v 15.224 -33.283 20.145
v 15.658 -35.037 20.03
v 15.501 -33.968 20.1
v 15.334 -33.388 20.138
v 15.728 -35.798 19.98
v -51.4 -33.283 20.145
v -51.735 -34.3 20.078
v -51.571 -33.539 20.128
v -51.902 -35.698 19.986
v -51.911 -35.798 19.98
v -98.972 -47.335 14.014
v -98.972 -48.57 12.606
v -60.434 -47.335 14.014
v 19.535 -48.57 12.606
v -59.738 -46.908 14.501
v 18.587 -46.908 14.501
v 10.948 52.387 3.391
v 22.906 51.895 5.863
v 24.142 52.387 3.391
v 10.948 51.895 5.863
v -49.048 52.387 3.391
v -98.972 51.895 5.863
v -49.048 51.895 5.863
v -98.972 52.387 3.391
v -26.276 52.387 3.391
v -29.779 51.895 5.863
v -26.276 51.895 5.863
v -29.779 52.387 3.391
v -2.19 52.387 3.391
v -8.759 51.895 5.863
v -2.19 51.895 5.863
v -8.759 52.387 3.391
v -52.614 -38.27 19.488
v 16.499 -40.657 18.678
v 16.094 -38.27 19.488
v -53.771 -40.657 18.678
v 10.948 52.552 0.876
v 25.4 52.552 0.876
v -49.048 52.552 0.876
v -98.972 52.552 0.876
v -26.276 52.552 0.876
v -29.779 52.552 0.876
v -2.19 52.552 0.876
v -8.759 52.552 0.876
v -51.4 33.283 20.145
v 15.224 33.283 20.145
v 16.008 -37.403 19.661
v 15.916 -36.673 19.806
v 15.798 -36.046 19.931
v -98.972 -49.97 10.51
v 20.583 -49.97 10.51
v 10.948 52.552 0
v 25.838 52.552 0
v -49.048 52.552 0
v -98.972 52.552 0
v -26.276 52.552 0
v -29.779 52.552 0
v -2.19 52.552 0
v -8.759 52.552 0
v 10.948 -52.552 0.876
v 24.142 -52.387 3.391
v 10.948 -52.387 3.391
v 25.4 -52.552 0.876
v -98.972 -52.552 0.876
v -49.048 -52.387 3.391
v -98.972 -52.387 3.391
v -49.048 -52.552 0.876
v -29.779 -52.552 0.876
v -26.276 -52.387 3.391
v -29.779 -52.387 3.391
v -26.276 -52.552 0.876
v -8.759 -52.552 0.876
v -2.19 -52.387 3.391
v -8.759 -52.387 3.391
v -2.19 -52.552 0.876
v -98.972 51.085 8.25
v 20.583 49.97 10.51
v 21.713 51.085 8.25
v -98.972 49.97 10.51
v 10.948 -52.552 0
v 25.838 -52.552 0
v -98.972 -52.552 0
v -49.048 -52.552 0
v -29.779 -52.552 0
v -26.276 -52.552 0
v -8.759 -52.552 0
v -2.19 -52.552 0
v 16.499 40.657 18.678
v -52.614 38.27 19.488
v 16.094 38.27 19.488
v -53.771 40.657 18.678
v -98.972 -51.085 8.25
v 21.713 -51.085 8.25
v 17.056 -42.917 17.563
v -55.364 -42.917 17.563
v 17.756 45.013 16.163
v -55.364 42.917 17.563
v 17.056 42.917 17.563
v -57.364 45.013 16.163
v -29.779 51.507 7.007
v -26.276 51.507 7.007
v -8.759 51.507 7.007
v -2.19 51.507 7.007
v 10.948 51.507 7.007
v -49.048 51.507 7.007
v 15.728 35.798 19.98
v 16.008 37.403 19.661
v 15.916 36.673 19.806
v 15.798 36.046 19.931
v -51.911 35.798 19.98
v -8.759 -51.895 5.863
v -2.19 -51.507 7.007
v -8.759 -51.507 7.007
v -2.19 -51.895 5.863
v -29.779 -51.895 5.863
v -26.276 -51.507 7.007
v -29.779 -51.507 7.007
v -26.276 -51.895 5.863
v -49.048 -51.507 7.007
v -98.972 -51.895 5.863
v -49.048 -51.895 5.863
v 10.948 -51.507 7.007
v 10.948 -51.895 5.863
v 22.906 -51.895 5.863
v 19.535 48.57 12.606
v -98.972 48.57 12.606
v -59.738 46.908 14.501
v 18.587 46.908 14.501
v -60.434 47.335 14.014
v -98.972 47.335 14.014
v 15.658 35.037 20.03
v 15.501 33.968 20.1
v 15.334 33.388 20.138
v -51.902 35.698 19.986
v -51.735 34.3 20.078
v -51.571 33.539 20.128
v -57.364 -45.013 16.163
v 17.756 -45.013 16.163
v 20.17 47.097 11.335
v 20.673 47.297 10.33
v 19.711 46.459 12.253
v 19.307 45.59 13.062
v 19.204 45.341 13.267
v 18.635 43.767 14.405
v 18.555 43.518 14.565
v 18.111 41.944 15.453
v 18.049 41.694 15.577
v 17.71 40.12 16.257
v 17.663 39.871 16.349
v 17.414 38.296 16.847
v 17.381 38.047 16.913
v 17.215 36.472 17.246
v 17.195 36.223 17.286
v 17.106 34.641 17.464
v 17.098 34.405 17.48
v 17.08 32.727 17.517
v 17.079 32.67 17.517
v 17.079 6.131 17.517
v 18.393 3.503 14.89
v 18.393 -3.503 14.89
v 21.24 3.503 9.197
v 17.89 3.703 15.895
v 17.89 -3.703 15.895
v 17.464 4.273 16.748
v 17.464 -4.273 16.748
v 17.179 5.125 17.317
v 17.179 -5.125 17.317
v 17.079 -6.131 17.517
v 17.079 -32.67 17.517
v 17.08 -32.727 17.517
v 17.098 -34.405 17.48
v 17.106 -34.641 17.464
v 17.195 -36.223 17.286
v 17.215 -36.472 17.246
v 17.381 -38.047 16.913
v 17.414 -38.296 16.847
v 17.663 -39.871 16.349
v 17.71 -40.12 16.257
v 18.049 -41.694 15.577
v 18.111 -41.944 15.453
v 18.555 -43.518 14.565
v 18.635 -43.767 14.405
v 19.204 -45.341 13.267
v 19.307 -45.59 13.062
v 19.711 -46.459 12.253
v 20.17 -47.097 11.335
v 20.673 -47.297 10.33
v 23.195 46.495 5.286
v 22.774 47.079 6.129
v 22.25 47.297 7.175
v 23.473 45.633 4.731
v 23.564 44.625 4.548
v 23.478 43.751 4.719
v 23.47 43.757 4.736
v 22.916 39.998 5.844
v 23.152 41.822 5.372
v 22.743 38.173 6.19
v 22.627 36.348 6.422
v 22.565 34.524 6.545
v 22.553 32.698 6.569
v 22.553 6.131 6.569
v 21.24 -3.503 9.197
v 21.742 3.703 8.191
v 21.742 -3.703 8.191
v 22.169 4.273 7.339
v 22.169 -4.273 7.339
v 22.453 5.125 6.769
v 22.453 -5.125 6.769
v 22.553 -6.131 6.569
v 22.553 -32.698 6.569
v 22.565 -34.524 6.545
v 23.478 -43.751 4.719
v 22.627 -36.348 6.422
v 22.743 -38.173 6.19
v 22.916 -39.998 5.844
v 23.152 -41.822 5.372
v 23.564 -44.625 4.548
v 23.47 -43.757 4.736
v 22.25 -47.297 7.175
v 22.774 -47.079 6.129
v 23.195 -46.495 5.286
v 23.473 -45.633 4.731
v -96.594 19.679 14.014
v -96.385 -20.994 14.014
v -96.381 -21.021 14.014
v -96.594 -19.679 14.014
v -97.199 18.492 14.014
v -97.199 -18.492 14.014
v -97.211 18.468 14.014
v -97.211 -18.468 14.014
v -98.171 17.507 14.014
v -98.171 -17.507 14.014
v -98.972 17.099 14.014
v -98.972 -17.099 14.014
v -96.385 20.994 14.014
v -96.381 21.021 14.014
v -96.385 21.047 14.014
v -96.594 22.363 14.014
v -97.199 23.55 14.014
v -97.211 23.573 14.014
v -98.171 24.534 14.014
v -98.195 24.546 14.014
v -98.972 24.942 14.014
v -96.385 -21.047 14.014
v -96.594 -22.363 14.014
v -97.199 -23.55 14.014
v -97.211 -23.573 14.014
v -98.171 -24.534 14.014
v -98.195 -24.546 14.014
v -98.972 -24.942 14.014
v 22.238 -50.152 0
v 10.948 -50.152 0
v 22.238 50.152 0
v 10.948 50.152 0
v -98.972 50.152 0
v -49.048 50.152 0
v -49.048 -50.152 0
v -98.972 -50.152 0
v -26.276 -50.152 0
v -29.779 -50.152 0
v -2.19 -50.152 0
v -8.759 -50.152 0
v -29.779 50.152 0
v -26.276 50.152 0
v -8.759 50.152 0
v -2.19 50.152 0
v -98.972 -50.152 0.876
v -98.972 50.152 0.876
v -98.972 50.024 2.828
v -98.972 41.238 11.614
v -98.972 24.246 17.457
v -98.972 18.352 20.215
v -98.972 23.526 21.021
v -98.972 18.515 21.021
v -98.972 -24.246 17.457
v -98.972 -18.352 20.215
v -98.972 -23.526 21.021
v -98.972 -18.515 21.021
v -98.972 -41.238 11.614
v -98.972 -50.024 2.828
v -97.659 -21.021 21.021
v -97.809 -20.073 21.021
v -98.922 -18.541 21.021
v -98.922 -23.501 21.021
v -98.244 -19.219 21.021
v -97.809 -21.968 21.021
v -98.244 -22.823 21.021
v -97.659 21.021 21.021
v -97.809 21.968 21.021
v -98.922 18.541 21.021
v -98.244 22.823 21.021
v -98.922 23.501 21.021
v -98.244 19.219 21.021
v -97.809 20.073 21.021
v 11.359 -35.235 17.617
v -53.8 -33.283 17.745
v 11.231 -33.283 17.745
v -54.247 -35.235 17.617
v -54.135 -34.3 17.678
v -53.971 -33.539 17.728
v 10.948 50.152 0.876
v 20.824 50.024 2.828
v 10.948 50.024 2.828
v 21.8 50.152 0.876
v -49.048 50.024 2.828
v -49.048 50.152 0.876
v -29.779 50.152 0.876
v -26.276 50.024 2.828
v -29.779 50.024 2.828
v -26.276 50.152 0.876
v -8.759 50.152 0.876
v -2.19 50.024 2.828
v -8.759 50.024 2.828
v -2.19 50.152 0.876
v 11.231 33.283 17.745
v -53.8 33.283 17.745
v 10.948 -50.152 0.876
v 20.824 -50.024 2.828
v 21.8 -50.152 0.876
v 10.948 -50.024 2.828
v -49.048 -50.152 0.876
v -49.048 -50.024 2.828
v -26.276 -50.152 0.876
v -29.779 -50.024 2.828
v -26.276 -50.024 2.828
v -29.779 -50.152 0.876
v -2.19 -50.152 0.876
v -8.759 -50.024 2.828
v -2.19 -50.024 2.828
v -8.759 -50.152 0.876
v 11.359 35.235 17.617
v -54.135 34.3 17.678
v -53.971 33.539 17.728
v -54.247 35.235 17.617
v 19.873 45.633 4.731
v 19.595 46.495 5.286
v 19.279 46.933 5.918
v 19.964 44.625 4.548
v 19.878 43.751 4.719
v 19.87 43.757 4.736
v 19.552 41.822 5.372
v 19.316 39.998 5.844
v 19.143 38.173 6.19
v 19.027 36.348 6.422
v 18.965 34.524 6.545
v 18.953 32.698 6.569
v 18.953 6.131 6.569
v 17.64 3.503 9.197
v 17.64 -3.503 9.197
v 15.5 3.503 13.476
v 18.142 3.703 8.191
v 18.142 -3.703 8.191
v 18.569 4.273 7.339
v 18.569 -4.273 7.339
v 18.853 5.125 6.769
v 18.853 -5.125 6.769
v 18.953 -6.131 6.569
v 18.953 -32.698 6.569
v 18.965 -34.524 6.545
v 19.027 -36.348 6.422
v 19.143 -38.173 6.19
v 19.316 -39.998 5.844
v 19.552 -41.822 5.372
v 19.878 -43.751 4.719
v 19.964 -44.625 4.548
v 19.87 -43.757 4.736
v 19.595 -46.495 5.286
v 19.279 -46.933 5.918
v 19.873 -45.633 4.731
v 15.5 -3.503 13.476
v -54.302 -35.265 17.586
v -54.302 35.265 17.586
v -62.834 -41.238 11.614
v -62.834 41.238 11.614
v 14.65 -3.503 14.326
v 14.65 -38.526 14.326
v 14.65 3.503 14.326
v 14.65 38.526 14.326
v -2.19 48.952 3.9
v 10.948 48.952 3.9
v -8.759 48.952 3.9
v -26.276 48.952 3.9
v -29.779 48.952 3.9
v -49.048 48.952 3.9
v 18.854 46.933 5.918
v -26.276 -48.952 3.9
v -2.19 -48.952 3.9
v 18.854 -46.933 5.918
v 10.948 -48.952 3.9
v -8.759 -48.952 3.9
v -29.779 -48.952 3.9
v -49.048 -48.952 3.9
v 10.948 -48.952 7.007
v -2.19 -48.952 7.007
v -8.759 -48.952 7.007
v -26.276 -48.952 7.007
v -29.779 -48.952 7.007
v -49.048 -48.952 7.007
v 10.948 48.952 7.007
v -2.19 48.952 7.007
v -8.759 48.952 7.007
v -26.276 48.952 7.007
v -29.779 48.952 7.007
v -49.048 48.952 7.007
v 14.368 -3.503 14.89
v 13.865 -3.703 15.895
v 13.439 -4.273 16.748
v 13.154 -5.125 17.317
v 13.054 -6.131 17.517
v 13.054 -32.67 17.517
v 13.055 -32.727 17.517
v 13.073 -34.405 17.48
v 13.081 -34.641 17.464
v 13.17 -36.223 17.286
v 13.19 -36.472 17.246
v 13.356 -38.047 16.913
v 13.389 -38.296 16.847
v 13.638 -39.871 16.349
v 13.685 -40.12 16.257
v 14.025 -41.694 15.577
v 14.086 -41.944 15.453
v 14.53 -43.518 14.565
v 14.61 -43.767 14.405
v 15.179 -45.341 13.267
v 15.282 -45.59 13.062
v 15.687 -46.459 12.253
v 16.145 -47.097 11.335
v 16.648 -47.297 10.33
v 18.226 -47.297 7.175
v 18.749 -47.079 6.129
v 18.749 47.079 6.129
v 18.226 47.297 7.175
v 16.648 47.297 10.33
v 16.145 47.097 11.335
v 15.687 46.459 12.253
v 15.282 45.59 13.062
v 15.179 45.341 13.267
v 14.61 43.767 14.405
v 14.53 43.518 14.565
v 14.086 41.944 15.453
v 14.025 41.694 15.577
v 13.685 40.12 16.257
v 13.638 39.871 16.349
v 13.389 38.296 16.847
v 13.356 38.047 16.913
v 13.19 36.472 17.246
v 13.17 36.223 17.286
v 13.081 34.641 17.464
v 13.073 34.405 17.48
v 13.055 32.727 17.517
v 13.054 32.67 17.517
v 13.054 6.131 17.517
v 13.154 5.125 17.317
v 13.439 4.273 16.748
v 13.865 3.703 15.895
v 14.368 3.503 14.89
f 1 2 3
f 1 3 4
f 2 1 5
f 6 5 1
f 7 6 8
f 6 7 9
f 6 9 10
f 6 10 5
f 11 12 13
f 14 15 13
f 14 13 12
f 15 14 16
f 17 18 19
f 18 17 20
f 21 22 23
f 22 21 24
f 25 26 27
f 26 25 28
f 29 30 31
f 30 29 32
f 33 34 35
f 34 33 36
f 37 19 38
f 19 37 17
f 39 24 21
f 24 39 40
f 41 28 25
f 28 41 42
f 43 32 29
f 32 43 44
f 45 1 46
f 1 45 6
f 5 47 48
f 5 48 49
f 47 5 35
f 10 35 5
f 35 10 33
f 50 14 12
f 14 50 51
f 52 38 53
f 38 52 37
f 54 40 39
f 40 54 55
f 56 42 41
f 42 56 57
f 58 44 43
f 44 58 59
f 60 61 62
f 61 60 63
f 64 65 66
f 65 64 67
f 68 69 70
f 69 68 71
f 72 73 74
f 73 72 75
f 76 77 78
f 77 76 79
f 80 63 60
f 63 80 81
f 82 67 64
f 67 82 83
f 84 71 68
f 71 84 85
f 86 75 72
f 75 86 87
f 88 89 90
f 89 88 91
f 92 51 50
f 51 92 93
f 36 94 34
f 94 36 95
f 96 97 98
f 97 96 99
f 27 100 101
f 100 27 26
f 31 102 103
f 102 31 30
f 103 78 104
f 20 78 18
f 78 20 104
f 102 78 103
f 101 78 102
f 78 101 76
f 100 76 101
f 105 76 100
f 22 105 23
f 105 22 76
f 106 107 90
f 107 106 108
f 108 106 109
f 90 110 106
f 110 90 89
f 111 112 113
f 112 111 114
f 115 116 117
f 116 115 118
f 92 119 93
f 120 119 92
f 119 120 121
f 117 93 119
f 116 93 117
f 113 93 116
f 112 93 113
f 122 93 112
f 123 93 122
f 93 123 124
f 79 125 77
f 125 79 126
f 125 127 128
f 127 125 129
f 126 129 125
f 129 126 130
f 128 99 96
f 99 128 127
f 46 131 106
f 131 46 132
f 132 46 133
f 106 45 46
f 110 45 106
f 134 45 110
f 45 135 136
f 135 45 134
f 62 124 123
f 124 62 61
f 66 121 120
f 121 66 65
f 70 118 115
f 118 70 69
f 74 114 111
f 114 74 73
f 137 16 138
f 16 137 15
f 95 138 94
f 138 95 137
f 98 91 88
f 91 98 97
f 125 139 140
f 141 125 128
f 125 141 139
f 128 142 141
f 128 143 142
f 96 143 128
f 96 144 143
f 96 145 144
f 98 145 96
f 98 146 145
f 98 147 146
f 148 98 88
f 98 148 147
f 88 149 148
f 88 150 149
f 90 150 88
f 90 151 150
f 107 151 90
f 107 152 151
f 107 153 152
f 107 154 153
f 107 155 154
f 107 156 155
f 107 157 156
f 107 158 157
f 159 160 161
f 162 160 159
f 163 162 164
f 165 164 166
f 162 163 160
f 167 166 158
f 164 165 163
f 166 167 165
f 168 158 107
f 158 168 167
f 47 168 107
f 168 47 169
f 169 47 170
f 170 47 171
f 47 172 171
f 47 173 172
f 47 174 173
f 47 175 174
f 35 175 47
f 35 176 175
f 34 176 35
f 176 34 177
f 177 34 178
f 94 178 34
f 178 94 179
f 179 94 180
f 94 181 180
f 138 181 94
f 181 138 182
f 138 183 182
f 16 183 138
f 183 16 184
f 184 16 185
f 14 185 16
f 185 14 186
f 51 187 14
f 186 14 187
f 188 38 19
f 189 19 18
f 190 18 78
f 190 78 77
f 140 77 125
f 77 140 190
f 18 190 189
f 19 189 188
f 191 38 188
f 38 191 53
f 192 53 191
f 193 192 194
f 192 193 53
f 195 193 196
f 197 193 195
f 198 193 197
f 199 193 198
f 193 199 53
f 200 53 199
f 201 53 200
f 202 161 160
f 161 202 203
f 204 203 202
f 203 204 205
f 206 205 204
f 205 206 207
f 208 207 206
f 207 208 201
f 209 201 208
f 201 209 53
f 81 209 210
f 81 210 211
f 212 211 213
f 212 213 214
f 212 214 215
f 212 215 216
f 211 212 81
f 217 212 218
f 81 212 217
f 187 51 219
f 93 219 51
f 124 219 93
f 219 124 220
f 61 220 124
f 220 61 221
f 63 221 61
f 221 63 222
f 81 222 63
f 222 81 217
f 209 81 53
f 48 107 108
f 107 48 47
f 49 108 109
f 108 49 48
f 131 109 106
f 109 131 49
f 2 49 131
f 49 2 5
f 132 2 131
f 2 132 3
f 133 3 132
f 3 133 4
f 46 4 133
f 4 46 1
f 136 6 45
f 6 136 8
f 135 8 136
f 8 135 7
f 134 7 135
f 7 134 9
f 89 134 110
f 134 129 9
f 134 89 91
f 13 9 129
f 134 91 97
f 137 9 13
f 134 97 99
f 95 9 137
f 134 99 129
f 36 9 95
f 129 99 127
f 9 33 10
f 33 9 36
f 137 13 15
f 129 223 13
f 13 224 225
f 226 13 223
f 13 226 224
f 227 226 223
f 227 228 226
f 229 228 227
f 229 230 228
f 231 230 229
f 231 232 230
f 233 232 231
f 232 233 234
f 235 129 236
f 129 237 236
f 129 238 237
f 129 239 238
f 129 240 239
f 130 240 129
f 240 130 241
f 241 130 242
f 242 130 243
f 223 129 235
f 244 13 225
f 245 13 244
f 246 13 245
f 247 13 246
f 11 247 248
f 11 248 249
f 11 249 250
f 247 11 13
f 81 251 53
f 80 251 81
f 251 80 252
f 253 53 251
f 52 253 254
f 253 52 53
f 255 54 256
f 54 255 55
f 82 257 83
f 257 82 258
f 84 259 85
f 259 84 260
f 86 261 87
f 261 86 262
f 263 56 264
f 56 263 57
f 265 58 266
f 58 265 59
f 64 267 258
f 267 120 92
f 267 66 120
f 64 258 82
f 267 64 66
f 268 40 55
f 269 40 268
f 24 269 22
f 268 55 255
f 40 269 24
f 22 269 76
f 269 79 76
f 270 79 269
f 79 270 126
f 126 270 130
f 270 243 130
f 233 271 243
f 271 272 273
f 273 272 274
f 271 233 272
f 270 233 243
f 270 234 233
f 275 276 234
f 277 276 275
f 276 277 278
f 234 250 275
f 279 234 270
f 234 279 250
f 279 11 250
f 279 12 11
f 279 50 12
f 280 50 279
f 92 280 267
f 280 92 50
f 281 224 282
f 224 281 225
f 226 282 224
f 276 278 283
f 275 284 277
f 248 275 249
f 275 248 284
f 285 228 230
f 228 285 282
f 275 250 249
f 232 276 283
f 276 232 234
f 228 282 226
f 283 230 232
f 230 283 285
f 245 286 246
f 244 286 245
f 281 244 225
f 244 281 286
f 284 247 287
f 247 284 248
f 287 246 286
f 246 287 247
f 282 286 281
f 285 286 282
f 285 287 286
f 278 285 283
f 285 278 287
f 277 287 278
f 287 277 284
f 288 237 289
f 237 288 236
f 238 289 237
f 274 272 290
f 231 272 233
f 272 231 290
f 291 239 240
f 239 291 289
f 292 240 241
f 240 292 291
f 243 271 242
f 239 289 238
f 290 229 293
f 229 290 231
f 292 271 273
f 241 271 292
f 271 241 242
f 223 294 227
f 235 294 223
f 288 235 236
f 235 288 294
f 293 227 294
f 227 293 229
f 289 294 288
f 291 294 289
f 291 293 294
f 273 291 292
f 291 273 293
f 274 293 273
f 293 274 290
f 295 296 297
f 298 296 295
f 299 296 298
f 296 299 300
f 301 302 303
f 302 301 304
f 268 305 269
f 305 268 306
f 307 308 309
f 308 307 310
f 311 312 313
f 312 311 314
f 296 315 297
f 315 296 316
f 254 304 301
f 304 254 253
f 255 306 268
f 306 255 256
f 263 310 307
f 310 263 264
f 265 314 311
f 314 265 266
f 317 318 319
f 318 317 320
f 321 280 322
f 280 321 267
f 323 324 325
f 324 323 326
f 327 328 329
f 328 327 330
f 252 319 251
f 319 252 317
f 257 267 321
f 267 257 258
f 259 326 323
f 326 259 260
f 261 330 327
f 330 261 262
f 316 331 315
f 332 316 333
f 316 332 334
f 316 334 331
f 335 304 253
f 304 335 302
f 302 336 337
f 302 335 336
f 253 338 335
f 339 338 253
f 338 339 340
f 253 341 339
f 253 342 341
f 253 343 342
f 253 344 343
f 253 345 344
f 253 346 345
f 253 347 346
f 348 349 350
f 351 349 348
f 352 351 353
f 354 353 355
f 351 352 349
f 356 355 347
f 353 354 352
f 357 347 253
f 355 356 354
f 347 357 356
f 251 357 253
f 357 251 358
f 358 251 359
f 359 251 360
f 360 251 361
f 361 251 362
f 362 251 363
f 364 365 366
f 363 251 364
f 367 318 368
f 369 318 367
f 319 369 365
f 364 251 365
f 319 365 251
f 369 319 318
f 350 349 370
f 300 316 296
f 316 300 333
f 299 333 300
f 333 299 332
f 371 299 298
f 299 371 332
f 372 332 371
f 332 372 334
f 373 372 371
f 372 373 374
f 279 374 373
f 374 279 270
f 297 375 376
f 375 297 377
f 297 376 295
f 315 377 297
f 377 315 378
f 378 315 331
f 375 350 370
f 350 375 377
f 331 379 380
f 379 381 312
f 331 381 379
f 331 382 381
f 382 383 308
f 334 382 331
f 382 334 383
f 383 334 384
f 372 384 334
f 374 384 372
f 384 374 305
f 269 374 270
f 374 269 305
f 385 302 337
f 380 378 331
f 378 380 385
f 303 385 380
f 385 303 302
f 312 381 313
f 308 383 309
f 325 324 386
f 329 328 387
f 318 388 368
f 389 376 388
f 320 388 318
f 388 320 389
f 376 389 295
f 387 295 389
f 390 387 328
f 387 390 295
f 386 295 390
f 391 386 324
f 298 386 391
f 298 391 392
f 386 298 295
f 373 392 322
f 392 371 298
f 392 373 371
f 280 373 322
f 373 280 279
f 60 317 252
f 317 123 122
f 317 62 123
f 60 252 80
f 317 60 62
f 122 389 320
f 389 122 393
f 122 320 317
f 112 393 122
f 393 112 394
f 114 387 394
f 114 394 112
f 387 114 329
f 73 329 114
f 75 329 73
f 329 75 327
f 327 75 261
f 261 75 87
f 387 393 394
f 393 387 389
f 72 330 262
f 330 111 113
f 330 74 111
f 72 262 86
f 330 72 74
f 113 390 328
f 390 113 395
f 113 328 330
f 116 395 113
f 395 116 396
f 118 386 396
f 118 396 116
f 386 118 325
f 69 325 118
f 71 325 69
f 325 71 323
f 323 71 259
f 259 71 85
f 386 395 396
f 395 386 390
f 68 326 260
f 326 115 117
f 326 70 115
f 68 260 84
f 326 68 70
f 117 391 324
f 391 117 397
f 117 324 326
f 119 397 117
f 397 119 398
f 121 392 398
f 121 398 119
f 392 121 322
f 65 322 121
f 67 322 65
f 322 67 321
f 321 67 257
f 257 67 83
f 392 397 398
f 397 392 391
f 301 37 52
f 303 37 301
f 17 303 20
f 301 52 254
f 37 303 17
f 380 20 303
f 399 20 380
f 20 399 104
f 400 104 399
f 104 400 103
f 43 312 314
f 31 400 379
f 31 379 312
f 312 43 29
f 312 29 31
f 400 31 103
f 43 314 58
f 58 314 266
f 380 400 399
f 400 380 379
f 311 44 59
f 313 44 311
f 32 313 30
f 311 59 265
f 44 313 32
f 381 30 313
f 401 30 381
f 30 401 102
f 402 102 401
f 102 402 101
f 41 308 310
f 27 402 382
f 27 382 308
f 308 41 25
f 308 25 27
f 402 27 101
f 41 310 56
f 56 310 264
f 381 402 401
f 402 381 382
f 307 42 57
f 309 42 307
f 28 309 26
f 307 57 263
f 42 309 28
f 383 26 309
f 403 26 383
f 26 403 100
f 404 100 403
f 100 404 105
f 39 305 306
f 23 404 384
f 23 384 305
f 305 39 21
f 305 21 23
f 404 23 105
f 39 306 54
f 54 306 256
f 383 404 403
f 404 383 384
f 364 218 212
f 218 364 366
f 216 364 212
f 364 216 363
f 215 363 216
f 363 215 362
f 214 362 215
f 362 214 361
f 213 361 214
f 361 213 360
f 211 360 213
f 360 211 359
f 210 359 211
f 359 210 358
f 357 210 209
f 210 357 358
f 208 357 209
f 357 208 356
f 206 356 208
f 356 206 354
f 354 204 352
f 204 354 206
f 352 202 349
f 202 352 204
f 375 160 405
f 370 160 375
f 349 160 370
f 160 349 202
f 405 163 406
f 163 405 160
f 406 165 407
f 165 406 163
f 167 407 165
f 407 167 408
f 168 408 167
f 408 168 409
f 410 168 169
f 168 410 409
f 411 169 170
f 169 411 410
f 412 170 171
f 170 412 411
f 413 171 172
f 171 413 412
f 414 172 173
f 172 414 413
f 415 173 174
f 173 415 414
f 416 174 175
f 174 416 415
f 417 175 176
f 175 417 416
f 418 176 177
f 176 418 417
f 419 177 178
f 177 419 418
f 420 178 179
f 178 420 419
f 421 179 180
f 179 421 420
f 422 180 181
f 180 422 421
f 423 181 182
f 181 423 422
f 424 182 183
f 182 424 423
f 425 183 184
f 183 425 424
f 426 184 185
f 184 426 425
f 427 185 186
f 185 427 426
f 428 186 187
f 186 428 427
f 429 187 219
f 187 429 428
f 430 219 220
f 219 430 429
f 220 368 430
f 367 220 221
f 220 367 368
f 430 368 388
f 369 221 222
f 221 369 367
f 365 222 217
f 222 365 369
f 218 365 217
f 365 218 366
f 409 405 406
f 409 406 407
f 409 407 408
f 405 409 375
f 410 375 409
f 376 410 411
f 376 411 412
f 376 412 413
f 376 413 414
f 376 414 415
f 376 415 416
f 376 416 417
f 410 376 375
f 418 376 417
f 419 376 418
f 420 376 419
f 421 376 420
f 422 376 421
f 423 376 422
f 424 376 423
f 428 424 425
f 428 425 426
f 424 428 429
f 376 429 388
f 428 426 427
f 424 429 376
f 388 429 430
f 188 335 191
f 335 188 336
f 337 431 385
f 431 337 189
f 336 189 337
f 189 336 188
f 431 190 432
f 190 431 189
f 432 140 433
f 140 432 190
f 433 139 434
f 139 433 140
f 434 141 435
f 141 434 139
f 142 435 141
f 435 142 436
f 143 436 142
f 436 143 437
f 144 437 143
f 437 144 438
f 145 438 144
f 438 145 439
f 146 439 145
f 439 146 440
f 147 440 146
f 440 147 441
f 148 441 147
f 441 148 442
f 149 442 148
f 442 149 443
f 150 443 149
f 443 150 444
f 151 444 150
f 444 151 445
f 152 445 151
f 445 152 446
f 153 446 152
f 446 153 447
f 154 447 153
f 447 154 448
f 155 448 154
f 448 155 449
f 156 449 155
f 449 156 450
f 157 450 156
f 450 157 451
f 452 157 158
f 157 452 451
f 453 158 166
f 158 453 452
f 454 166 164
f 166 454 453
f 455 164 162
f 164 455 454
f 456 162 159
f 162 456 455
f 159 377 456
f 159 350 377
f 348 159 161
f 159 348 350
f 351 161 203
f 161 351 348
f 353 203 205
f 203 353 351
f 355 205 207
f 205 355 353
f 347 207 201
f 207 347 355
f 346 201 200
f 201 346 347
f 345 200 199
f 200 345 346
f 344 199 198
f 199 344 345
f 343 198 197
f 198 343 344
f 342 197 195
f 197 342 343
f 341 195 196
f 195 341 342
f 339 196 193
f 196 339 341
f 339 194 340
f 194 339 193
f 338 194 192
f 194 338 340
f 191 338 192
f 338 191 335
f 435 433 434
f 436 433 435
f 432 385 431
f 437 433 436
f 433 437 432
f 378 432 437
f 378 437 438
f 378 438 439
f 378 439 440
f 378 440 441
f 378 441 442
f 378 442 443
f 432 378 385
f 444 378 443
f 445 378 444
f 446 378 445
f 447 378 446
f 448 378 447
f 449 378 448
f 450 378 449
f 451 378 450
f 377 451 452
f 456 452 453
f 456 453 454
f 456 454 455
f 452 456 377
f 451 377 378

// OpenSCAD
// Milwaukee Road Little Joe, G scale 1-29 - print 8 of 20: roof_4 - roof, section 4 (print upright)
// Render (F6), export STL, print. Settings: ../../library/lj_params.scad
// Whole loco preview and notes: ../../MILW_LittleJoe_Main.scad
SCALE_SEL = "G";
LOCO_SEL = "E70";   // [E20, E21, E70, E71, E72, E73, E74, E75, E76, E77, E78, E79] the body and roof change for E20 / E21
include <../../library/lj_all.scad>
lj_plate("roof_4");
